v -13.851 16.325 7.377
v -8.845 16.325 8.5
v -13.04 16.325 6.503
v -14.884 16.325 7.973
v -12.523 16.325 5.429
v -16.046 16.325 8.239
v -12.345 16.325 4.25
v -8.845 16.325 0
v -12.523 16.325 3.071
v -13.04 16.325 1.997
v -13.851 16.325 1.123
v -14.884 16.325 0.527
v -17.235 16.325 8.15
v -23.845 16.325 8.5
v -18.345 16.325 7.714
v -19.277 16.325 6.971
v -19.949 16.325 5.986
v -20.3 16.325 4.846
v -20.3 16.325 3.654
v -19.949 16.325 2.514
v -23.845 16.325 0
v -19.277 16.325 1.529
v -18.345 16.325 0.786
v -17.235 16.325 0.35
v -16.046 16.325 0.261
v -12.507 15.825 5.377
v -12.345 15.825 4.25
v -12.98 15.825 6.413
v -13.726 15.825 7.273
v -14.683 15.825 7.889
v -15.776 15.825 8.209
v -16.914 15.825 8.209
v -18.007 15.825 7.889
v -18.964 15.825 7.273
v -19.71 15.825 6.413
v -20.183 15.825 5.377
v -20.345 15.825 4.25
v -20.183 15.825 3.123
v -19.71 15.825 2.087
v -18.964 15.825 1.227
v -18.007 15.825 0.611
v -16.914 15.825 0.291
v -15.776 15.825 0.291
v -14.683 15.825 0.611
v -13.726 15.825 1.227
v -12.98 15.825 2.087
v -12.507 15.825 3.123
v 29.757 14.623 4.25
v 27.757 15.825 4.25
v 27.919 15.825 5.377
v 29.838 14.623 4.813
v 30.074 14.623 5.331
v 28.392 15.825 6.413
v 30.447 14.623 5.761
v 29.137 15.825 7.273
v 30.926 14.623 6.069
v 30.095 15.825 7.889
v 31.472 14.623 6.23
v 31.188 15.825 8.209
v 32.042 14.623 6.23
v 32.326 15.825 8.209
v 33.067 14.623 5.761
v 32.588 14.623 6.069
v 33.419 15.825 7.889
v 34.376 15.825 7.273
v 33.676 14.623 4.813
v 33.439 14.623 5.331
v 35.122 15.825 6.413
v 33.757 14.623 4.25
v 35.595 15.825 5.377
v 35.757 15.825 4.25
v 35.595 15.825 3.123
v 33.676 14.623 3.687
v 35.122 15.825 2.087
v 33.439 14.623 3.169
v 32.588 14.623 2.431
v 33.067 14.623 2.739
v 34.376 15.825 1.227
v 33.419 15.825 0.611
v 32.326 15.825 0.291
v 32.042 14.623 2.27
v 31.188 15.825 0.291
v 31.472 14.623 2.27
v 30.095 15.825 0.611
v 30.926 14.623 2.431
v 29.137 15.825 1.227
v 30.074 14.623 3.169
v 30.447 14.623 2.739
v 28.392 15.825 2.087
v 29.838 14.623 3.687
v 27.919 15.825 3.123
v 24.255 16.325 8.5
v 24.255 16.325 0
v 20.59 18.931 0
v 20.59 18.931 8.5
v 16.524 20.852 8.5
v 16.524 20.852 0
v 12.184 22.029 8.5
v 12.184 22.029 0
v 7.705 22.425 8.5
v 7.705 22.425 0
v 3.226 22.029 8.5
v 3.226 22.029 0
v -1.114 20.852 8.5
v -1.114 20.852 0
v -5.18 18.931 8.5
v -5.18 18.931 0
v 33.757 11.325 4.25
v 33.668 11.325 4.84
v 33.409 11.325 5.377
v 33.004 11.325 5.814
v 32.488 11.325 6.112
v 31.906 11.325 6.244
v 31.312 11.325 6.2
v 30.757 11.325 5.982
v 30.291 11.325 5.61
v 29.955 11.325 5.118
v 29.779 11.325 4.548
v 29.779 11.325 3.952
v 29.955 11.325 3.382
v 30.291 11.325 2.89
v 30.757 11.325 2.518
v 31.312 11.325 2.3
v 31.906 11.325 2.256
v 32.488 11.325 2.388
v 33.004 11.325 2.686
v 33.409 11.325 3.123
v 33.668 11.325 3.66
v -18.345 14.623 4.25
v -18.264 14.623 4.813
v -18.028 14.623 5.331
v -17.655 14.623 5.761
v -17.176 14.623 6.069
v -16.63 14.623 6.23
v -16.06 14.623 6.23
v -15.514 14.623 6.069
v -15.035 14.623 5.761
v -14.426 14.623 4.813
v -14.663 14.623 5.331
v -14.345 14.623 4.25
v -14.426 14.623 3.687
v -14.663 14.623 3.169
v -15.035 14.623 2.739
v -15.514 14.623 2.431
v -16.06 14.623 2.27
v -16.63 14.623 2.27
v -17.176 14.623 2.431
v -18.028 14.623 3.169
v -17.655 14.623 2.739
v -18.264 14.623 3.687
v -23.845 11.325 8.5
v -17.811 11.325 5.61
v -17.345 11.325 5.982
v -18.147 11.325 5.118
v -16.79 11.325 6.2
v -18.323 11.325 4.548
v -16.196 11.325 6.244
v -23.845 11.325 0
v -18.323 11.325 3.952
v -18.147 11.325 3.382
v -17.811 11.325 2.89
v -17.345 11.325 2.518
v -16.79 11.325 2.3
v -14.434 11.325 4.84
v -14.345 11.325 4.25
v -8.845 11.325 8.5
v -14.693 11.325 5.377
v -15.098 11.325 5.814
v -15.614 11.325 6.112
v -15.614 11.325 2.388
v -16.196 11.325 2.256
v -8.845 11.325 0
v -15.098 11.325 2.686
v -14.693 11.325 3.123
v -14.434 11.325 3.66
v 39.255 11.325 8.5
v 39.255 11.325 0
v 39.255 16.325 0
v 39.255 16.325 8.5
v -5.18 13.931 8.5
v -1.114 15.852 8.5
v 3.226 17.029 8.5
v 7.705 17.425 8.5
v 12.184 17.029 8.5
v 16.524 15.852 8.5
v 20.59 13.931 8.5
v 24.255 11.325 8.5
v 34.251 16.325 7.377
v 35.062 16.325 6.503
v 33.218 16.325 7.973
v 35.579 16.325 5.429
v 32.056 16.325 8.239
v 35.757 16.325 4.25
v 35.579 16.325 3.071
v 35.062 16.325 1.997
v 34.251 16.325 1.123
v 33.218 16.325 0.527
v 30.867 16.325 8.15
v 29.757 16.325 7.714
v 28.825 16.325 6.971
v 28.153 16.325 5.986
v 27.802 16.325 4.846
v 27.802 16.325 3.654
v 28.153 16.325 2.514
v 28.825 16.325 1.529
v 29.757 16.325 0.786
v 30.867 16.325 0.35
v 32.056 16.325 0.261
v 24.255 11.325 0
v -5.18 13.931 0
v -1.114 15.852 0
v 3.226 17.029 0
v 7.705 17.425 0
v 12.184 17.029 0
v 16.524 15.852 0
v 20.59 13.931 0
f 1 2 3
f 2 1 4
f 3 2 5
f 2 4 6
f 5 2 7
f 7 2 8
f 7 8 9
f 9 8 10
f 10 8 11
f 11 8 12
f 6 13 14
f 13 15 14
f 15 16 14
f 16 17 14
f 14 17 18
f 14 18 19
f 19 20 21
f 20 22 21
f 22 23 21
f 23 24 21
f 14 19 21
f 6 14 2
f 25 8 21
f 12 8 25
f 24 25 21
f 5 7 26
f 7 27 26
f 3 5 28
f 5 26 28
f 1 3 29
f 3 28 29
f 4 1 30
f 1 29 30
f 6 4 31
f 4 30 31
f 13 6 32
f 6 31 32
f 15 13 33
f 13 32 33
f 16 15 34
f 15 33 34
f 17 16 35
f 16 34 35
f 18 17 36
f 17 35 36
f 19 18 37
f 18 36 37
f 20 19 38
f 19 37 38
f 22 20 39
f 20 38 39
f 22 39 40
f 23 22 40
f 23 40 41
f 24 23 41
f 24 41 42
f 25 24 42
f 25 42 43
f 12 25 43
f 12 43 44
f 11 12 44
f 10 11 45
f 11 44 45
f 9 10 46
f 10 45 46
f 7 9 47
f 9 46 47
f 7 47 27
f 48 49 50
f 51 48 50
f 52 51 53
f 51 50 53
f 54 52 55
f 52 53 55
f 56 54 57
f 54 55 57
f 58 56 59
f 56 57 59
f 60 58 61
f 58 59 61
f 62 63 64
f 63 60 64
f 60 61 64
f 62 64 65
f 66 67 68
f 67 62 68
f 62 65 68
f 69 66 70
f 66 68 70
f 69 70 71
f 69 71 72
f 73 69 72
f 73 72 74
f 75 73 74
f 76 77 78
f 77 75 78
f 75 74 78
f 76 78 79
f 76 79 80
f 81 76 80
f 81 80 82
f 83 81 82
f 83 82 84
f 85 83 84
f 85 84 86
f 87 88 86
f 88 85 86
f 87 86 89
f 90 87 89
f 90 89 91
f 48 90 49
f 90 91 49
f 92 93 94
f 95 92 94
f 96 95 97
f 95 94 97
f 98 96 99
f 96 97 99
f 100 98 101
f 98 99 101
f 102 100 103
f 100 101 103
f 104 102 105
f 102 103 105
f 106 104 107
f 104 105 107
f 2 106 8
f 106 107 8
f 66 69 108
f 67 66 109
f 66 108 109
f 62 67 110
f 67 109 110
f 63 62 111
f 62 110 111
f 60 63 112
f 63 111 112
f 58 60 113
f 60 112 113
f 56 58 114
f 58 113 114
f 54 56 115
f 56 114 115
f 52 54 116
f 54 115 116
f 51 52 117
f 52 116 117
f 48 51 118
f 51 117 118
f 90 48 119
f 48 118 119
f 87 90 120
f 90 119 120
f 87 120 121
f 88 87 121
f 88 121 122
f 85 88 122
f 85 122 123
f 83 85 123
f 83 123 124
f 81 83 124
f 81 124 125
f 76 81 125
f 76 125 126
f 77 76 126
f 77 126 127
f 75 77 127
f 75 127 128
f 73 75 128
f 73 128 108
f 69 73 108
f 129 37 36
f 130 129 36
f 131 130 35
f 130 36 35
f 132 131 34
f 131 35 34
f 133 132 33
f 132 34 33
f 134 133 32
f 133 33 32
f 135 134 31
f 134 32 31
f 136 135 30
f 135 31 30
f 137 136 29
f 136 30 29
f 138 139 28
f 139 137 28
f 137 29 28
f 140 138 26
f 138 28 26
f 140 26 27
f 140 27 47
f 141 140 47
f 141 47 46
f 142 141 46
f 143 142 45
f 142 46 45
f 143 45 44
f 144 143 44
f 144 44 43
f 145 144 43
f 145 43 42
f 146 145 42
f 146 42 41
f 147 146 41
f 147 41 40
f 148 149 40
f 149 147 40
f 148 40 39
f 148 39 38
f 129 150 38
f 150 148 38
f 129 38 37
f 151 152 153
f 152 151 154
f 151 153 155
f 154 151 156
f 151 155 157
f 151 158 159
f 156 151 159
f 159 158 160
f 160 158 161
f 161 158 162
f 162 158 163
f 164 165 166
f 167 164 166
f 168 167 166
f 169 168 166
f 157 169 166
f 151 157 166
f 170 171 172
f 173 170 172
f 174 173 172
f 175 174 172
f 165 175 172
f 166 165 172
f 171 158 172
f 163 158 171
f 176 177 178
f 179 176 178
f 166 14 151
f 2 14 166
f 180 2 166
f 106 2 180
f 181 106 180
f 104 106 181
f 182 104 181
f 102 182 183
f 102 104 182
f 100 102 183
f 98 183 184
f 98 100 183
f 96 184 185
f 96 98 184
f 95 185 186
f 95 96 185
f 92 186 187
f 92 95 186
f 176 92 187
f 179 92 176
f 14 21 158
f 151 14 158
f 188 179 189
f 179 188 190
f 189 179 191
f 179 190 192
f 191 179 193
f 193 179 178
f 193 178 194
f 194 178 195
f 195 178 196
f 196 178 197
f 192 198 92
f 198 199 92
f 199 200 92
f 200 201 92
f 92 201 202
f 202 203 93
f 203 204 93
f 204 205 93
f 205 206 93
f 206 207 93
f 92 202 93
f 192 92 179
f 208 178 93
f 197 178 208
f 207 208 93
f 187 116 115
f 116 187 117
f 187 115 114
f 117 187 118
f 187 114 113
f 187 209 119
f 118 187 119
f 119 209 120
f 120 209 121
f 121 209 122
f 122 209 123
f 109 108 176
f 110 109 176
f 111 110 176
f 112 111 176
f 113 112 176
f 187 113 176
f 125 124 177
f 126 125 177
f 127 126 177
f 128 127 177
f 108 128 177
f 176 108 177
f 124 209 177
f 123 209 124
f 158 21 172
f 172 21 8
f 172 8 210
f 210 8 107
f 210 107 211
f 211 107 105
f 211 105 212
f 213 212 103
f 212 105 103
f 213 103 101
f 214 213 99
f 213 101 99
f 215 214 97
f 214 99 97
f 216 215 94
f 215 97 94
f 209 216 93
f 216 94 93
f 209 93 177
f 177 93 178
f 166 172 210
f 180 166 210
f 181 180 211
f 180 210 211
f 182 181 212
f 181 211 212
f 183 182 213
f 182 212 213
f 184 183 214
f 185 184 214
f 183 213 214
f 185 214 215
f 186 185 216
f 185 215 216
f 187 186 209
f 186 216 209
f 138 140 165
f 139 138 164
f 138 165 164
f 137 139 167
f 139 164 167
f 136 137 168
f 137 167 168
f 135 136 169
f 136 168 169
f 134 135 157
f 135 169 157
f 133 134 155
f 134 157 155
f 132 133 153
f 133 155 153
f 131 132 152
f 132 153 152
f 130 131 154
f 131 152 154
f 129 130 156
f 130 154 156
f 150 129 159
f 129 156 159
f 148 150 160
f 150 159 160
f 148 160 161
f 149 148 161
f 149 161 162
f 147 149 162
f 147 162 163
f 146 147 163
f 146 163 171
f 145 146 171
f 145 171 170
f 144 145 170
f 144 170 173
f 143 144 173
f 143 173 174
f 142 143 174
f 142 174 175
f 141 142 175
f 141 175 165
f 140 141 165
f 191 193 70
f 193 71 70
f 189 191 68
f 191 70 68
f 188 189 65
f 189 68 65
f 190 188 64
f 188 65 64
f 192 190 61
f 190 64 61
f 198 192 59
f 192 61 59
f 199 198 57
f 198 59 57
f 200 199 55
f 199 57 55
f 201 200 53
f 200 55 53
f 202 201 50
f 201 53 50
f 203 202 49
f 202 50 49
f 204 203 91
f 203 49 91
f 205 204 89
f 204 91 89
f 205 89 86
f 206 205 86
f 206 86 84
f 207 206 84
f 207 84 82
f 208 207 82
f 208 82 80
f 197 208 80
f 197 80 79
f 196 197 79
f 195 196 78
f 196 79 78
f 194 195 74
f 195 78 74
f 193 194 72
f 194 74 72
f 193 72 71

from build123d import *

# Parameters (mm, degrees)
F1_DEPTH = 8.5
F3_D     = 8
F3_DEPTH = 0.5
F3_TIP   = 2.4034424761
F4_D     = 4
F4_DEPTH = 12
F4_START = 1.7017212
F4_TIP   = 1.2017212381


with BuildPart() as f1:
    # F0 (on Top) → F1 (new body)
    with BuildSketch(Plane.XY):
        with BuildLine():
            ThreePointArc((-8.8450443894, 11.325138621), (7.7049556106, 17.425138621), (24.2549556106, 11.325138621))
            Line((24.2549556106, 11.325138621), (39.2549556106, 11.325138621))
            Line((39.2549556106, 11.325138621), (39.2549556106, 16.325138621))
            Line((39.2549556106, 16.325138621), (24.2549556106, 16.325138621))
            ThreePointArc((24.2549556106, 16.325138621), (7.7049556106, 22.425138621), (-8.8450443894, 16.325138621))
            Line((-8.8450443894, 16.325138621), (-23.8450443894, 16.325138621))
            Line((-23.8450443894, 16.325138621), (-23.8450443894, 11.325138621))
            Line((-23.8450443894, 11.325138621), (-8.8450443894, 11.325138621))
        make_face()
    extrude(amount=F1_DEPTH)

    # F3
    with Locations(Plane(origin=(0, 16.325138621, 0), x_dir=(-1, 0, 0), z_dir=(0, 1, 0))):
        with Locations((-31.7569042742, 4.25), (16.3450443894, 4.25)):
            Hole(F3_D / 2, depth=F3_DEPTH)
            with Locations((0, 0, -(F3_DEPTH + F3_TIP / 2))):  # 118° drill point
                Cone(0, F3_D / 2, F3_TIP, mode=Mode.SUBTRACT)

    # F4
    # its depths count from where the whole tool has entered the part; down to there all is cleared
    with Locations(Plane(origin=(0, 16.325138621, 0), x_dir=(-1, 0, 0), z_dir=(0, 1, 0)).offset(-F4_START)):
        with Locations((-31.7569042742, 4.25), (16.3450443894, 4.25)):
            Hole(F4_D / 2, depth=F4_DEPTH)
            with Locations((0, 0, -(F4_DEPTH + F4_TIP / 2))):  # 118° drill point
                Cone(0, F4_D / 2, F4_TIP, mode=Mode.SUBTRACT)


solid = f1.part
